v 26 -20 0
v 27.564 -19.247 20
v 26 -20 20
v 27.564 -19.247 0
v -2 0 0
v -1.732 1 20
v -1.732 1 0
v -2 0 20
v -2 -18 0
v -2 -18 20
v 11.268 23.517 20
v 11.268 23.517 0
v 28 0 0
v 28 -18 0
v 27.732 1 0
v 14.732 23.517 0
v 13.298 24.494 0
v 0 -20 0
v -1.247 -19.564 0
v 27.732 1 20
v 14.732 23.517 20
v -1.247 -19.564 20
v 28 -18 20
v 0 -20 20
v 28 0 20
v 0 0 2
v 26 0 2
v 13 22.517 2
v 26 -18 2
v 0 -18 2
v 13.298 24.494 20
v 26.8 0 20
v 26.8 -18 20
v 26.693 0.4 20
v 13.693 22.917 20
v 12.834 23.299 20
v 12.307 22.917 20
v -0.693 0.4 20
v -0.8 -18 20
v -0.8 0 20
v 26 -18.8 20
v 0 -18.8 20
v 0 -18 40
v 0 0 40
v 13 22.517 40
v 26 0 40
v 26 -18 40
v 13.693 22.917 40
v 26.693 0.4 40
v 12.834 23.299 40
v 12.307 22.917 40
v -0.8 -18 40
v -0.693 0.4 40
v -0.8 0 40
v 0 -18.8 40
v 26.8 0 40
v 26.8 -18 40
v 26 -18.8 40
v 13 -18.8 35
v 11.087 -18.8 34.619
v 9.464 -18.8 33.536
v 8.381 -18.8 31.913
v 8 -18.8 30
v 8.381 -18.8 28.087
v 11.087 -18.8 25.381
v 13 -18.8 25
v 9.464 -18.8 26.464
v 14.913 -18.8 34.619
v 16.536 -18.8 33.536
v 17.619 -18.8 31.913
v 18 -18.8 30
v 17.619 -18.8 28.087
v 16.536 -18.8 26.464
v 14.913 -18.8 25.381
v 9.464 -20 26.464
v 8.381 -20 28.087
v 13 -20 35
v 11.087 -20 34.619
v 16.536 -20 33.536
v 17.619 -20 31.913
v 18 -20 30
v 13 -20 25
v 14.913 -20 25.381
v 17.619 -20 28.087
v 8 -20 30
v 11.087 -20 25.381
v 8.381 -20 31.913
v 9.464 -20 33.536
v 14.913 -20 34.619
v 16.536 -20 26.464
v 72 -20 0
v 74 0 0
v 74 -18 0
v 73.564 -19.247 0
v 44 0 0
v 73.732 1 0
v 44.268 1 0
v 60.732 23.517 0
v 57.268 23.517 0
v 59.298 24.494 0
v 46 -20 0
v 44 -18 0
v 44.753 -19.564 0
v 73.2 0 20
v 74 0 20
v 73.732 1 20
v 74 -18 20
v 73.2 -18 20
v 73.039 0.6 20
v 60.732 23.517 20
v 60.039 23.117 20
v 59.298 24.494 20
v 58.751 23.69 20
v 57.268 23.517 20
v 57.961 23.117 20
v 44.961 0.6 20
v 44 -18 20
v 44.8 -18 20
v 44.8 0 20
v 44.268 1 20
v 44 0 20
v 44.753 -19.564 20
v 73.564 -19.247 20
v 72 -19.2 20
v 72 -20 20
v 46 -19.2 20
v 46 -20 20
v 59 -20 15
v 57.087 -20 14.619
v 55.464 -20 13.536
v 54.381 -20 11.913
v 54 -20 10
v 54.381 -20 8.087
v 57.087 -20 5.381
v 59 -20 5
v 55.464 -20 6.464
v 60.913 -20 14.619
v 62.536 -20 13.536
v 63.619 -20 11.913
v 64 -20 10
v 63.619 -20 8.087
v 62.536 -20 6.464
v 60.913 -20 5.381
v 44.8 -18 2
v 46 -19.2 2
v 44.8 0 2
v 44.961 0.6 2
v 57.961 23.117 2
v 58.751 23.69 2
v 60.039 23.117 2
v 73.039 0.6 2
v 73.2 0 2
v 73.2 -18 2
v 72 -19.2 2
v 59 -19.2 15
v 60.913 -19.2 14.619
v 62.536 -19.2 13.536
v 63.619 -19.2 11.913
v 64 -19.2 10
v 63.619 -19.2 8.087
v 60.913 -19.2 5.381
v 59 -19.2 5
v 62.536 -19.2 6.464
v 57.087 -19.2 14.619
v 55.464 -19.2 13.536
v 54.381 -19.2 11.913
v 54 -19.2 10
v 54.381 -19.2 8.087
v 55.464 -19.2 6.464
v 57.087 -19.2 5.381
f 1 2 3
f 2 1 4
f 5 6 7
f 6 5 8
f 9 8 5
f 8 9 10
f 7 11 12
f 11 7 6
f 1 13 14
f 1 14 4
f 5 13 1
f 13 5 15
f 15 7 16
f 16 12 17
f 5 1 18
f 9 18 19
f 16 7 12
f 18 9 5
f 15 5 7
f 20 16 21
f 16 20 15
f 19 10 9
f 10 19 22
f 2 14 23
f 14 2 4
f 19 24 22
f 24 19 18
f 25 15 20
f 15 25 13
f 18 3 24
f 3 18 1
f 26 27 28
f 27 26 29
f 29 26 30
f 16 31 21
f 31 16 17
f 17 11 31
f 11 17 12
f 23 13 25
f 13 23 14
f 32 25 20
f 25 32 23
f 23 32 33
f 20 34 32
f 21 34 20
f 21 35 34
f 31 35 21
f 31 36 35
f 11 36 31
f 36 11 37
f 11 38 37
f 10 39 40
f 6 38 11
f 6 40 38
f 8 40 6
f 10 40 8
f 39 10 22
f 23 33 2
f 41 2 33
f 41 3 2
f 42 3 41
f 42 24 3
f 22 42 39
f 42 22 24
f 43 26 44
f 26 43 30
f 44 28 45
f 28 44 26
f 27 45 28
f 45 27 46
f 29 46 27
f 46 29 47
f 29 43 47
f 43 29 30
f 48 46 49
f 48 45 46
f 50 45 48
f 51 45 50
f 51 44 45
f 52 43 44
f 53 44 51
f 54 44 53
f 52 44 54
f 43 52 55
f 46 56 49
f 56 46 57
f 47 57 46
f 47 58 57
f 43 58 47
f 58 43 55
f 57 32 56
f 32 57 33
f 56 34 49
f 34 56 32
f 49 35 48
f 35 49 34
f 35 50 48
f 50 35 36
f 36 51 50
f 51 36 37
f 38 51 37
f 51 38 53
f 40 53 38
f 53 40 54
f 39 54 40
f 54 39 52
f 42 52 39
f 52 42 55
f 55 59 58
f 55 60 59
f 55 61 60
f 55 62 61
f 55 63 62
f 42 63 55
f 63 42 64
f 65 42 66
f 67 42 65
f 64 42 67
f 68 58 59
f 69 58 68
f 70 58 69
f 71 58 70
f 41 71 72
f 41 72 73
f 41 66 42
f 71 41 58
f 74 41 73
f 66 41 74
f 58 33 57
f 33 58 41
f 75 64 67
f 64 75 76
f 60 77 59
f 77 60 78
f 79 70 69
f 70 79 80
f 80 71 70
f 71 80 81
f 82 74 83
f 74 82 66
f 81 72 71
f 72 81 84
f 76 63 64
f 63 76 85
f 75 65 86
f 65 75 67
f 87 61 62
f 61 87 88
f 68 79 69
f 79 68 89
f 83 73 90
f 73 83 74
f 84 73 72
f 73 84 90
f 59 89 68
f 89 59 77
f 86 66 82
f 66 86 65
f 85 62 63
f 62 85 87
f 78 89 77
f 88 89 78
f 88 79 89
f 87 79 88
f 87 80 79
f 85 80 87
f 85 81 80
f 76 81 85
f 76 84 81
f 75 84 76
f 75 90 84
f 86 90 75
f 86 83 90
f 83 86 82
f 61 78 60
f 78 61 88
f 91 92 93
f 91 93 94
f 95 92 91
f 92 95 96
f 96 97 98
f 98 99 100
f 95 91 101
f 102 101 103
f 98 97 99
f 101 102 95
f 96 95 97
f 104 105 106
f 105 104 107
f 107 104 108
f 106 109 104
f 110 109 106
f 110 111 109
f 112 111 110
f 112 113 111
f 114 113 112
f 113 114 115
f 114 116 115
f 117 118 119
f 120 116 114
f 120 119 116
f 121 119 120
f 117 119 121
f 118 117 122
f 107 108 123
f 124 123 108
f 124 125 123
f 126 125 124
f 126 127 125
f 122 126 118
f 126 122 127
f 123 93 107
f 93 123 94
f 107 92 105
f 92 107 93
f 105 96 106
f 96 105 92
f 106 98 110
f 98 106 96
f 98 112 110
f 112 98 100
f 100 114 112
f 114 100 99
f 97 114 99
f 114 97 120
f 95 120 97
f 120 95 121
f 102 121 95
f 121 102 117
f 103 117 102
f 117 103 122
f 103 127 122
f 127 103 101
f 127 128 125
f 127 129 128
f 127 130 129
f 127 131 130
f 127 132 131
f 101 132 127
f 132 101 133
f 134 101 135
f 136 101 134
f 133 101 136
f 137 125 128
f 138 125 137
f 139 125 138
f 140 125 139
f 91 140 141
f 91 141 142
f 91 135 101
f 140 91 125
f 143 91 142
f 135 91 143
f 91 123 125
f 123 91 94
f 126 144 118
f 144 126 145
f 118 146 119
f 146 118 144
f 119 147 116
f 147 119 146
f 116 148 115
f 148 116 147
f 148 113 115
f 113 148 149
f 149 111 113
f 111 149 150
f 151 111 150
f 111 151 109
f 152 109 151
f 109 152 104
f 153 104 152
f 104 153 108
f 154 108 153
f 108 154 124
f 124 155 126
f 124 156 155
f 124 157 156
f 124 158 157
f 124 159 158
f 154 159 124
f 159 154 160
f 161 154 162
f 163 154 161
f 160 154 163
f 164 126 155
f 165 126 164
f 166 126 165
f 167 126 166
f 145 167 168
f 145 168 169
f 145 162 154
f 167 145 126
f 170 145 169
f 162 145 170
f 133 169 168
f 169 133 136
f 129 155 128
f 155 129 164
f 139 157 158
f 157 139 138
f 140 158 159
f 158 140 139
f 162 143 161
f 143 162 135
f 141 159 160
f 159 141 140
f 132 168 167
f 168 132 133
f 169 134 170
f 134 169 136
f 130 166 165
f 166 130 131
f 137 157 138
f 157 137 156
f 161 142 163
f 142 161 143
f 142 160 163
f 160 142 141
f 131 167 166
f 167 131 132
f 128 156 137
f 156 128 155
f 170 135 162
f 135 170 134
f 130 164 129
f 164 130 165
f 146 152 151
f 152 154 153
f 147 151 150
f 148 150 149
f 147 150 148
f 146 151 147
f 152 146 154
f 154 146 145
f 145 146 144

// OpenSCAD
// file: SnapContainer.scad
module container_shape(width, box_width, box_depth) {
    polygon([[0,0], [width,0], [width/2,sin(60) * width]]);
    center_align_offset =  (width-box_width)/2;
    polygon([
        [center_align_offset,0],
        [width-center_align_offset,0],
        [width-center_align_offset,-box_depth],
        [center_align_offset,-box_depth]
    ]);
}

module triangle_container(width, height, box_width, box_depth, wall_thickness=2) {
	linear_extrude(wall_thickness) {
        offset(wall_thickness) {
            container_shape(width, box_width, box_depth);
        }
	}

	linear_extrude(height) {
		difference() {
			offset(wall_thickness) {
				container_shape(width, box_width, box_depth);
			}
			container_shape(width, box_width, box_depth);
        }
			
    }
}

module triangle_container_case(width, height, box_width=0, box_depth=0, box_height=0, wall_thickness=2, overlap = 20) {
	
	triangle_container(width, height-(overlap/2), box_width, box_depth, wall_thickness);
    linear_extrude(height-box_height) {
        center_align_offset =  (width-box_width)/2;
        polygon([
            [center_align_offset,0],
            [width-center_align_offset,0],
            [width-center_align_offset,-box_depth],
            [center_align_offset,-box_depth]
        ]);
    }

	translate([0,0,height-(overlap/2)]) {
		linear_extrude(overlap) {
			difference() {
				offset(wall_thickness/2 -.2) {
					container_shape(width, box_width, box_depth);
				}
				container_shape(width, box_width, box_depth);
				
			}
		}
        translate([width/2,-box_depth,overlap/2]) {
            rotate([90,0,0]) linear_extrude(wall_thickness) circle(5);
        }
	}
}

module triangle_container_lid(width, height=0, box_width=0, box_depth=0, wall_thickness=2, overlap = 20) {

	triangle_container(width, lid_height, box_width, box_depth, wall_thickness);
	translate([0,0,lid_height]) {
        difference() {
            linear_extrude(overlap) {
                difference() {
                    offset(wall_thickness) {
                        container_shape(width, box_width, box_depth);
                    }
                    offset(wall_thickness/2 + .2)
                    container_shape(width, box_width, box_depth);
                }
            }
            translate([width/2,-box_depth,overlap/2]) {
                rotate([90,0,0]) linear_extrude(wall_thickness) circle(5);
            }
        }
	}
}




width = 26;
height = 30;
box_width = 26;
box_depth = 18;
box_height = 30;
lid_height = 0;

// Case
triangle_container_case(width, height - lid_height, box_width, box_depth, 
box_height - lid_height, 2, 20);

//Lid
translate([width + 20, 0, 0])
triangle_container_lid(width, lid_height);
// main file
use <SnapContainer.scad>;

width = 26;
height = 30;
box_width = 26;
box_depth = 18;
box_height = 30;
lid_height = 0;

// Case
triangle_container_case(width, height - lid_height, box_width, box_depth, box_height - lid_height, 2, 20);

//Lid
translate([width + 20, 0, 0])
triangle_container_lid(width, lid_height, box_width, box_depth, 2, 20);
